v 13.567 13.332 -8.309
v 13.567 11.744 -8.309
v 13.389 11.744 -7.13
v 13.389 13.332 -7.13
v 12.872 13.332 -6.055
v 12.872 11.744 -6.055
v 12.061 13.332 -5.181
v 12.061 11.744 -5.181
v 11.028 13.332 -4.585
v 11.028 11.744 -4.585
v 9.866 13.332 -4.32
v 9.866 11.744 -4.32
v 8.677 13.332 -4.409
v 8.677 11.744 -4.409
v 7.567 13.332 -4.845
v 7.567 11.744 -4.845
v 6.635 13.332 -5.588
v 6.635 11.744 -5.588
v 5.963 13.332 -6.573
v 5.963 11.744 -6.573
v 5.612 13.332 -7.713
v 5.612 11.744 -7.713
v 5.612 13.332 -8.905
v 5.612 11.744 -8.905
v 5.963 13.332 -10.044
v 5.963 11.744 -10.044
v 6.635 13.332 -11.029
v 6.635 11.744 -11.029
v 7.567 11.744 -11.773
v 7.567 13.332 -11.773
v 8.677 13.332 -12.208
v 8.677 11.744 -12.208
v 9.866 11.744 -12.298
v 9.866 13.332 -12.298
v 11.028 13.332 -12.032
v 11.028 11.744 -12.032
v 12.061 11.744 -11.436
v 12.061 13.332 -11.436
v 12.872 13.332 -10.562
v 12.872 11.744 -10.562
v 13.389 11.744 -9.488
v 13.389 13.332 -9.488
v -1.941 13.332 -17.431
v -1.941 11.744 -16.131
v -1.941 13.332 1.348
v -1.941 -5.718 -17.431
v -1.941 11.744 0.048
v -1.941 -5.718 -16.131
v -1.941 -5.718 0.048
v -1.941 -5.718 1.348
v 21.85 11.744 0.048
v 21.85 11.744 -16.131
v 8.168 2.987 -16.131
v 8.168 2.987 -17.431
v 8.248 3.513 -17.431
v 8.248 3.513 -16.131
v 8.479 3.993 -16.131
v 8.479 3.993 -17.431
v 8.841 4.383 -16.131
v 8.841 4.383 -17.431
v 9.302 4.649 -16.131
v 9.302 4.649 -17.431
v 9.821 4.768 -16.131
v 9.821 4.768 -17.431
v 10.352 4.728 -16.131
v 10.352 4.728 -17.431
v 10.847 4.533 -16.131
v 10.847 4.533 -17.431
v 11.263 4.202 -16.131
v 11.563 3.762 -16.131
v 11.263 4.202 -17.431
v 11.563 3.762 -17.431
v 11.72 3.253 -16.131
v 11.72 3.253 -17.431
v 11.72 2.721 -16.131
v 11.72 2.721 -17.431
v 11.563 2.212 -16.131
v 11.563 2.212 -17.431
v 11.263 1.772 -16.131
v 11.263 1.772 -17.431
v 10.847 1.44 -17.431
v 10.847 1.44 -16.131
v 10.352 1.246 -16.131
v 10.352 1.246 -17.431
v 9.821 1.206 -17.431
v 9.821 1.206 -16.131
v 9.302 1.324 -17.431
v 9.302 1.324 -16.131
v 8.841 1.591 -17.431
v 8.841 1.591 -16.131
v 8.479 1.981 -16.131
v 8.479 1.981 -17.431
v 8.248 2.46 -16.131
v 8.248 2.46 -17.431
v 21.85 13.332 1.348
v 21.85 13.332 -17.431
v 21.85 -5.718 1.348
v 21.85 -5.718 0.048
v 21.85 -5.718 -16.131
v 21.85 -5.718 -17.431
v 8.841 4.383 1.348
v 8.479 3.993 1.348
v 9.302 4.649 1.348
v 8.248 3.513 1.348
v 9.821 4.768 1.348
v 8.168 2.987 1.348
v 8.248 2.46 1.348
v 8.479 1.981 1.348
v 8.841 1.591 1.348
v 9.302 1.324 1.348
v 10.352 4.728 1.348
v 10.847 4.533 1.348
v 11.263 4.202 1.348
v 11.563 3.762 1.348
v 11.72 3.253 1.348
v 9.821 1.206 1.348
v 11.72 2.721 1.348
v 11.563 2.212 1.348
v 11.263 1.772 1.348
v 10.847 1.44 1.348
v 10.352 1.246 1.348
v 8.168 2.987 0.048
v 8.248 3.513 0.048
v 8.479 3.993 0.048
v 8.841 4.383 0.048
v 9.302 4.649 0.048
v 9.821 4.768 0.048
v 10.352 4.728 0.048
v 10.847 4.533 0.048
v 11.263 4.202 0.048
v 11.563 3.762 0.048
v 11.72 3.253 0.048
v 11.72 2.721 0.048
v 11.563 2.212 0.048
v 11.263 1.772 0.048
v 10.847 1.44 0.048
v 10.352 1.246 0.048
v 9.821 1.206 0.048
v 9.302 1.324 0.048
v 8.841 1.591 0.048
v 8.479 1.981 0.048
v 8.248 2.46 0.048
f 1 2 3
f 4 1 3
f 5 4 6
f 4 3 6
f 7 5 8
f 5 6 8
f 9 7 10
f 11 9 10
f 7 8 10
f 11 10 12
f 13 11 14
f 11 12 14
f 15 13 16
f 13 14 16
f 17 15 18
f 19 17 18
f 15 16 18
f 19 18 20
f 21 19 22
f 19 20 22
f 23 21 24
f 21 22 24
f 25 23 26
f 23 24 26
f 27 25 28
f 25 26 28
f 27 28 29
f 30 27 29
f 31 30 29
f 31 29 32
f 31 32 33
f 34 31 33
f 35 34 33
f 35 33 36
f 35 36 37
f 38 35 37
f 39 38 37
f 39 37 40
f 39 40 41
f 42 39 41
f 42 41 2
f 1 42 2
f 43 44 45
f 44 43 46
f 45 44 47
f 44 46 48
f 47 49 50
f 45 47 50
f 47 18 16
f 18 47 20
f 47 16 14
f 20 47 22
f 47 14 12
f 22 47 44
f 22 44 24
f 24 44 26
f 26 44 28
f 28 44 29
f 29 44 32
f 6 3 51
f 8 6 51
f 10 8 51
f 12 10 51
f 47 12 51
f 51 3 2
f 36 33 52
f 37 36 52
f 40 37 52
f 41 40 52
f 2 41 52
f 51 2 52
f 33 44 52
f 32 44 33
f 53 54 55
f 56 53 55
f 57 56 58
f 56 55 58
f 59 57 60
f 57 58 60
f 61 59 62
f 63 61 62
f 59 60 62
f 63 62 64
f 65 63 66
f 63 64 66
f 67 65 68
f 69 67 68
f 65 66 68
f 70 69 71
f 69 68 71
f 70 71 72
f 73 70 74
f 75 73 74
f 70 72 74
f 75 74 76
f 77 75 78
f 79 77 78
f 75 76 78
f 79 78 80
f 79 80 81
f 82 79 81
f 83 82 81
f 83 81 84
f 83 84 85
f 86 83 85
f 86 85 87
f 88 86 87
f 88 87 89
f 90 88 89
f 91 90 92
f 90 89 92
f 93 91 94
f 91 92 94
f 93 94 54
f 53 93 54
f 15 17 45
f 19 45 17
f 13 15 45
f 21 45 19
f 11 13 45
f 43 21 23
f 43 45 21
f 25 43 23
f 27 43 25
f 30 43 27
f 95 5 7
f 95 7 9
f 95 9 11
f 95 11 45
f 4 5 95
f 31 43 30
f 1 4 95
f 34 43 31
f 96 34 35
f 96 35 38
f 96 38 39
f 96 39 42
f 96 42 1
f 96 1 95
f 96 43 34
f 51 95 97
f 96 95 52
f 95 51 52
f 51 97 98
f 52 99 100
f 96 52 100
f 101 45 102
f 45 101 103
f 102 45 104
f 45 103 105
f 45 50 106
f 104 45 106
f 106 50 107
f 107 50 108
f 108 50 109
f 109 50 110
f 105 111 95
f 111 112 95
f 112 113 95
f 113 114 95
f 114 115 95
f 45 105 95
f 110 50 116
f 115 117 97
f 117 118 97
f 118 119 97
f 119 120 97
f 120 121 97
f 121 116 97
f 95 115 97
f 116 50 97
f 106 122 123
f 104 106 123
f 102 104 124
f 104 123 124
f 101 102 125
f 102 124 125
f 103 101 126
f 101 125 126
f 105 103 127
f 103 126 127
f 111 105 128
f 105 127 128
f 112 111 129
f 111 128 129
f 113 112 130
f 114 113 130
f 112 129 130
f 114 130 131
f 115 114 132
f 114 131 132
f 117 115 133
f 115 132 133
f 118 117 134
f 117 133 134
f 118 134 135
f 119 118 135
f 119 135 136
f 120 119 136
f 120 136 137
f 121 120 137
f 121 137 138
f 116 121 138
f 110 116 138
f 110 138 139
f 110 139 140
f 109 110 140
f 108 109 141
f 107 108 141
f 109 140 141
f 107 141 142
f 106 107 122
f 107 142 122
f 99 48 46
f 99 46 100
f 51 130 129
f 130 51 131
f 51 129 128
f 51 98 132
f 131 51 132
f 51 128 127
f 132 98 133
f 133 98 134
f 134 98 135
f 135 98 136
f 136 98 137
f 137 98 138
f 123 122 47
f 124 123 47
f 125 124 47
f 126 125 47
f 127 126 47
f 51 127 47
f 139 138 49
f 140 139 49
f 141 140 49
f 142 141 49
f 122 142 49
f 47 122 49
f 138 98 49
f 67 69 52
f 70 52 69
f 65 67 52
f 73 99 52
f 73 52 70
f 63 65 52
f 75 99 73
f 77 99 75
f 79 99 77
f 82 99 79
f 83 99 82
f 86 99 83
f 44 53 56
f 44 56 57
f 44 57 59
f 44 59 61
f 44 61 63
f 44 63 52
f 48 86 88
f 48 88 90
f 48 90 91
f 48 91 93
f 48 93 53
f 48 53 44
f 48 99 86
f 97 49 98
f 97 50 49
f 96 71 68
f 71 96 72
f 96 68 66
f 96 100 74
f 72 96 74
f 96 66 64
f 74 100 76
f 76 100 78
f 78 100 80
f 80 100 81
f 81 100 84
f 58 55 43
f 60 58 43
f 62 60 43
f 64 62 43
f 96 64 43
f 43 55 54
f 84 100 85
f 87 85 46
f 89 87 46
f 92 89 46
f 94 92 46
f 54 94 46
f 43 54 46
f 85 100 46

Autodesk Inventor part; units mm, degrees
ref_plane "YZ Plane" through (0, 0, 0) normal (1, 0, 0) x (0, 1, 0)
ref_plane "XZ Plane" through (0, 0, 0) normal (0, 1, 0) x (-1, 0, 0)
ref_plane "XY Plane" through (0, 0, 0) normal (0, 0, 1) x (1, 0, 0)
ref_plane "Work Plane1" through (13.7597, -5.7182, -8.0415) normal (0, -1, 0) x (1, 0, 0)
sketch "Sketch1" plane through (13.7597, -5.7182, -8.0415) normal (0, -1, 0) x (1, 0, 0)
  line L0 (8.0899, -8.0899) -> (8.0899, 8.0899) construction
  line L1 (8.0899, 8.0899) -> (-8.0899, 8.0899) construction
  line L2 (-8.0899, 8.0899) -> (-8.0899, -8.0899) construction
  line L3 (-8.0899, -8.0899) -> (8.0899, -8.0899) construction
  line L4 (8.0899, 8.0899) -> (-15.7007, 8.0899)
  line L5 (-15.7007, 8.0899) -> (-15.7007, 9.3894)
  line L6 (-15.7007, 9.3894) -> (8.0899, 9.3894)
  line L7 (8.0899, 9.3894) -> (8.0899, 8.0899)
  line L8 (8.0899, -8.0899) -> (-15.7007, -8.0899)
  line L9 (-15.7007, -8.0899) -> (-15.7007, -9.3894)
  line L10 (-15.7007, -9.3894) -> (8.0899, -9.3894)
  line L11 (8.0899, -9.3894) -> (8.0899, -8.0899)
  point P0 (-13.7597, 8.0415)
extrude "Extrusion1" add sketch "Sketch1" against normal blind 17.4625
sketch "Sketch2" plane through (21.8496, -5.7182, -17.4309) normal (0, 0, -1) x (-1, 0, 0)
  circle A0 centre (11.8953, 8.705) radius 1.7859
  line L0 (23.6468, 17.41) -> (0, 0) construction
  line L1 (0, 0) -> (23.7906, 0) construction
  line L2 (23.7906, 0) -> (0, 17.41) construction
  point P0 (21.8496, 5.7182)
extrude "Extrusion2" cut sketch "Sketch2" against normal through all
sketch "Sketch3" plane through (13.7597, 11.7443, -8.0415) normal (0, 1, 0) x (1, 0, 0)
  line L0 (-15.7007, -9.3894) -> (8.0899, -9.3894) construction
  line L1 (-15.7007, -8.0899) -> (-15.7007, -9.3894) construction
  line L2 (8.0899, 9.3894) -> (-15.7007, 9.3894) construction
  line L3 (8.0899, 8.0899) -> (8.0899, 9.3894) construction
  line L4 (-15.7007, -9.3894) -> (8.0899, -9.3894)
  line L5 (8.0899, -9.3894) -> (8.0899, 9.3894)
  line L6 (8.0899, 9.3894) -> (-15.7007, 9.3894)
  line L7 (-15.7007, 9.3894) -> (-15.7007, -9.3894)
  point P0 (-13.7597, -8.0415)
extrude "Extrusion3" add sketch "Sketch3" along normal blind 1.5875
sketch "Sketch5" plane through (13.7597, 11.7443, -8.0415) normal (0, -1, 0) x (1, 0, 0)
  point P0 (-13.7597, 8.0415)
sketch "Sketch6" plane through (13.7597, 11.7443, -8.0415) normal (0, -1, 0) x (1, 0, 0)
  circle A0 centre (-4.1928, -0.2672) radius 4 projected
  point P0 (-13.7597, 8.0415)
extrude "Extrusion5" cut sketch "Sketch6" against normal through all
